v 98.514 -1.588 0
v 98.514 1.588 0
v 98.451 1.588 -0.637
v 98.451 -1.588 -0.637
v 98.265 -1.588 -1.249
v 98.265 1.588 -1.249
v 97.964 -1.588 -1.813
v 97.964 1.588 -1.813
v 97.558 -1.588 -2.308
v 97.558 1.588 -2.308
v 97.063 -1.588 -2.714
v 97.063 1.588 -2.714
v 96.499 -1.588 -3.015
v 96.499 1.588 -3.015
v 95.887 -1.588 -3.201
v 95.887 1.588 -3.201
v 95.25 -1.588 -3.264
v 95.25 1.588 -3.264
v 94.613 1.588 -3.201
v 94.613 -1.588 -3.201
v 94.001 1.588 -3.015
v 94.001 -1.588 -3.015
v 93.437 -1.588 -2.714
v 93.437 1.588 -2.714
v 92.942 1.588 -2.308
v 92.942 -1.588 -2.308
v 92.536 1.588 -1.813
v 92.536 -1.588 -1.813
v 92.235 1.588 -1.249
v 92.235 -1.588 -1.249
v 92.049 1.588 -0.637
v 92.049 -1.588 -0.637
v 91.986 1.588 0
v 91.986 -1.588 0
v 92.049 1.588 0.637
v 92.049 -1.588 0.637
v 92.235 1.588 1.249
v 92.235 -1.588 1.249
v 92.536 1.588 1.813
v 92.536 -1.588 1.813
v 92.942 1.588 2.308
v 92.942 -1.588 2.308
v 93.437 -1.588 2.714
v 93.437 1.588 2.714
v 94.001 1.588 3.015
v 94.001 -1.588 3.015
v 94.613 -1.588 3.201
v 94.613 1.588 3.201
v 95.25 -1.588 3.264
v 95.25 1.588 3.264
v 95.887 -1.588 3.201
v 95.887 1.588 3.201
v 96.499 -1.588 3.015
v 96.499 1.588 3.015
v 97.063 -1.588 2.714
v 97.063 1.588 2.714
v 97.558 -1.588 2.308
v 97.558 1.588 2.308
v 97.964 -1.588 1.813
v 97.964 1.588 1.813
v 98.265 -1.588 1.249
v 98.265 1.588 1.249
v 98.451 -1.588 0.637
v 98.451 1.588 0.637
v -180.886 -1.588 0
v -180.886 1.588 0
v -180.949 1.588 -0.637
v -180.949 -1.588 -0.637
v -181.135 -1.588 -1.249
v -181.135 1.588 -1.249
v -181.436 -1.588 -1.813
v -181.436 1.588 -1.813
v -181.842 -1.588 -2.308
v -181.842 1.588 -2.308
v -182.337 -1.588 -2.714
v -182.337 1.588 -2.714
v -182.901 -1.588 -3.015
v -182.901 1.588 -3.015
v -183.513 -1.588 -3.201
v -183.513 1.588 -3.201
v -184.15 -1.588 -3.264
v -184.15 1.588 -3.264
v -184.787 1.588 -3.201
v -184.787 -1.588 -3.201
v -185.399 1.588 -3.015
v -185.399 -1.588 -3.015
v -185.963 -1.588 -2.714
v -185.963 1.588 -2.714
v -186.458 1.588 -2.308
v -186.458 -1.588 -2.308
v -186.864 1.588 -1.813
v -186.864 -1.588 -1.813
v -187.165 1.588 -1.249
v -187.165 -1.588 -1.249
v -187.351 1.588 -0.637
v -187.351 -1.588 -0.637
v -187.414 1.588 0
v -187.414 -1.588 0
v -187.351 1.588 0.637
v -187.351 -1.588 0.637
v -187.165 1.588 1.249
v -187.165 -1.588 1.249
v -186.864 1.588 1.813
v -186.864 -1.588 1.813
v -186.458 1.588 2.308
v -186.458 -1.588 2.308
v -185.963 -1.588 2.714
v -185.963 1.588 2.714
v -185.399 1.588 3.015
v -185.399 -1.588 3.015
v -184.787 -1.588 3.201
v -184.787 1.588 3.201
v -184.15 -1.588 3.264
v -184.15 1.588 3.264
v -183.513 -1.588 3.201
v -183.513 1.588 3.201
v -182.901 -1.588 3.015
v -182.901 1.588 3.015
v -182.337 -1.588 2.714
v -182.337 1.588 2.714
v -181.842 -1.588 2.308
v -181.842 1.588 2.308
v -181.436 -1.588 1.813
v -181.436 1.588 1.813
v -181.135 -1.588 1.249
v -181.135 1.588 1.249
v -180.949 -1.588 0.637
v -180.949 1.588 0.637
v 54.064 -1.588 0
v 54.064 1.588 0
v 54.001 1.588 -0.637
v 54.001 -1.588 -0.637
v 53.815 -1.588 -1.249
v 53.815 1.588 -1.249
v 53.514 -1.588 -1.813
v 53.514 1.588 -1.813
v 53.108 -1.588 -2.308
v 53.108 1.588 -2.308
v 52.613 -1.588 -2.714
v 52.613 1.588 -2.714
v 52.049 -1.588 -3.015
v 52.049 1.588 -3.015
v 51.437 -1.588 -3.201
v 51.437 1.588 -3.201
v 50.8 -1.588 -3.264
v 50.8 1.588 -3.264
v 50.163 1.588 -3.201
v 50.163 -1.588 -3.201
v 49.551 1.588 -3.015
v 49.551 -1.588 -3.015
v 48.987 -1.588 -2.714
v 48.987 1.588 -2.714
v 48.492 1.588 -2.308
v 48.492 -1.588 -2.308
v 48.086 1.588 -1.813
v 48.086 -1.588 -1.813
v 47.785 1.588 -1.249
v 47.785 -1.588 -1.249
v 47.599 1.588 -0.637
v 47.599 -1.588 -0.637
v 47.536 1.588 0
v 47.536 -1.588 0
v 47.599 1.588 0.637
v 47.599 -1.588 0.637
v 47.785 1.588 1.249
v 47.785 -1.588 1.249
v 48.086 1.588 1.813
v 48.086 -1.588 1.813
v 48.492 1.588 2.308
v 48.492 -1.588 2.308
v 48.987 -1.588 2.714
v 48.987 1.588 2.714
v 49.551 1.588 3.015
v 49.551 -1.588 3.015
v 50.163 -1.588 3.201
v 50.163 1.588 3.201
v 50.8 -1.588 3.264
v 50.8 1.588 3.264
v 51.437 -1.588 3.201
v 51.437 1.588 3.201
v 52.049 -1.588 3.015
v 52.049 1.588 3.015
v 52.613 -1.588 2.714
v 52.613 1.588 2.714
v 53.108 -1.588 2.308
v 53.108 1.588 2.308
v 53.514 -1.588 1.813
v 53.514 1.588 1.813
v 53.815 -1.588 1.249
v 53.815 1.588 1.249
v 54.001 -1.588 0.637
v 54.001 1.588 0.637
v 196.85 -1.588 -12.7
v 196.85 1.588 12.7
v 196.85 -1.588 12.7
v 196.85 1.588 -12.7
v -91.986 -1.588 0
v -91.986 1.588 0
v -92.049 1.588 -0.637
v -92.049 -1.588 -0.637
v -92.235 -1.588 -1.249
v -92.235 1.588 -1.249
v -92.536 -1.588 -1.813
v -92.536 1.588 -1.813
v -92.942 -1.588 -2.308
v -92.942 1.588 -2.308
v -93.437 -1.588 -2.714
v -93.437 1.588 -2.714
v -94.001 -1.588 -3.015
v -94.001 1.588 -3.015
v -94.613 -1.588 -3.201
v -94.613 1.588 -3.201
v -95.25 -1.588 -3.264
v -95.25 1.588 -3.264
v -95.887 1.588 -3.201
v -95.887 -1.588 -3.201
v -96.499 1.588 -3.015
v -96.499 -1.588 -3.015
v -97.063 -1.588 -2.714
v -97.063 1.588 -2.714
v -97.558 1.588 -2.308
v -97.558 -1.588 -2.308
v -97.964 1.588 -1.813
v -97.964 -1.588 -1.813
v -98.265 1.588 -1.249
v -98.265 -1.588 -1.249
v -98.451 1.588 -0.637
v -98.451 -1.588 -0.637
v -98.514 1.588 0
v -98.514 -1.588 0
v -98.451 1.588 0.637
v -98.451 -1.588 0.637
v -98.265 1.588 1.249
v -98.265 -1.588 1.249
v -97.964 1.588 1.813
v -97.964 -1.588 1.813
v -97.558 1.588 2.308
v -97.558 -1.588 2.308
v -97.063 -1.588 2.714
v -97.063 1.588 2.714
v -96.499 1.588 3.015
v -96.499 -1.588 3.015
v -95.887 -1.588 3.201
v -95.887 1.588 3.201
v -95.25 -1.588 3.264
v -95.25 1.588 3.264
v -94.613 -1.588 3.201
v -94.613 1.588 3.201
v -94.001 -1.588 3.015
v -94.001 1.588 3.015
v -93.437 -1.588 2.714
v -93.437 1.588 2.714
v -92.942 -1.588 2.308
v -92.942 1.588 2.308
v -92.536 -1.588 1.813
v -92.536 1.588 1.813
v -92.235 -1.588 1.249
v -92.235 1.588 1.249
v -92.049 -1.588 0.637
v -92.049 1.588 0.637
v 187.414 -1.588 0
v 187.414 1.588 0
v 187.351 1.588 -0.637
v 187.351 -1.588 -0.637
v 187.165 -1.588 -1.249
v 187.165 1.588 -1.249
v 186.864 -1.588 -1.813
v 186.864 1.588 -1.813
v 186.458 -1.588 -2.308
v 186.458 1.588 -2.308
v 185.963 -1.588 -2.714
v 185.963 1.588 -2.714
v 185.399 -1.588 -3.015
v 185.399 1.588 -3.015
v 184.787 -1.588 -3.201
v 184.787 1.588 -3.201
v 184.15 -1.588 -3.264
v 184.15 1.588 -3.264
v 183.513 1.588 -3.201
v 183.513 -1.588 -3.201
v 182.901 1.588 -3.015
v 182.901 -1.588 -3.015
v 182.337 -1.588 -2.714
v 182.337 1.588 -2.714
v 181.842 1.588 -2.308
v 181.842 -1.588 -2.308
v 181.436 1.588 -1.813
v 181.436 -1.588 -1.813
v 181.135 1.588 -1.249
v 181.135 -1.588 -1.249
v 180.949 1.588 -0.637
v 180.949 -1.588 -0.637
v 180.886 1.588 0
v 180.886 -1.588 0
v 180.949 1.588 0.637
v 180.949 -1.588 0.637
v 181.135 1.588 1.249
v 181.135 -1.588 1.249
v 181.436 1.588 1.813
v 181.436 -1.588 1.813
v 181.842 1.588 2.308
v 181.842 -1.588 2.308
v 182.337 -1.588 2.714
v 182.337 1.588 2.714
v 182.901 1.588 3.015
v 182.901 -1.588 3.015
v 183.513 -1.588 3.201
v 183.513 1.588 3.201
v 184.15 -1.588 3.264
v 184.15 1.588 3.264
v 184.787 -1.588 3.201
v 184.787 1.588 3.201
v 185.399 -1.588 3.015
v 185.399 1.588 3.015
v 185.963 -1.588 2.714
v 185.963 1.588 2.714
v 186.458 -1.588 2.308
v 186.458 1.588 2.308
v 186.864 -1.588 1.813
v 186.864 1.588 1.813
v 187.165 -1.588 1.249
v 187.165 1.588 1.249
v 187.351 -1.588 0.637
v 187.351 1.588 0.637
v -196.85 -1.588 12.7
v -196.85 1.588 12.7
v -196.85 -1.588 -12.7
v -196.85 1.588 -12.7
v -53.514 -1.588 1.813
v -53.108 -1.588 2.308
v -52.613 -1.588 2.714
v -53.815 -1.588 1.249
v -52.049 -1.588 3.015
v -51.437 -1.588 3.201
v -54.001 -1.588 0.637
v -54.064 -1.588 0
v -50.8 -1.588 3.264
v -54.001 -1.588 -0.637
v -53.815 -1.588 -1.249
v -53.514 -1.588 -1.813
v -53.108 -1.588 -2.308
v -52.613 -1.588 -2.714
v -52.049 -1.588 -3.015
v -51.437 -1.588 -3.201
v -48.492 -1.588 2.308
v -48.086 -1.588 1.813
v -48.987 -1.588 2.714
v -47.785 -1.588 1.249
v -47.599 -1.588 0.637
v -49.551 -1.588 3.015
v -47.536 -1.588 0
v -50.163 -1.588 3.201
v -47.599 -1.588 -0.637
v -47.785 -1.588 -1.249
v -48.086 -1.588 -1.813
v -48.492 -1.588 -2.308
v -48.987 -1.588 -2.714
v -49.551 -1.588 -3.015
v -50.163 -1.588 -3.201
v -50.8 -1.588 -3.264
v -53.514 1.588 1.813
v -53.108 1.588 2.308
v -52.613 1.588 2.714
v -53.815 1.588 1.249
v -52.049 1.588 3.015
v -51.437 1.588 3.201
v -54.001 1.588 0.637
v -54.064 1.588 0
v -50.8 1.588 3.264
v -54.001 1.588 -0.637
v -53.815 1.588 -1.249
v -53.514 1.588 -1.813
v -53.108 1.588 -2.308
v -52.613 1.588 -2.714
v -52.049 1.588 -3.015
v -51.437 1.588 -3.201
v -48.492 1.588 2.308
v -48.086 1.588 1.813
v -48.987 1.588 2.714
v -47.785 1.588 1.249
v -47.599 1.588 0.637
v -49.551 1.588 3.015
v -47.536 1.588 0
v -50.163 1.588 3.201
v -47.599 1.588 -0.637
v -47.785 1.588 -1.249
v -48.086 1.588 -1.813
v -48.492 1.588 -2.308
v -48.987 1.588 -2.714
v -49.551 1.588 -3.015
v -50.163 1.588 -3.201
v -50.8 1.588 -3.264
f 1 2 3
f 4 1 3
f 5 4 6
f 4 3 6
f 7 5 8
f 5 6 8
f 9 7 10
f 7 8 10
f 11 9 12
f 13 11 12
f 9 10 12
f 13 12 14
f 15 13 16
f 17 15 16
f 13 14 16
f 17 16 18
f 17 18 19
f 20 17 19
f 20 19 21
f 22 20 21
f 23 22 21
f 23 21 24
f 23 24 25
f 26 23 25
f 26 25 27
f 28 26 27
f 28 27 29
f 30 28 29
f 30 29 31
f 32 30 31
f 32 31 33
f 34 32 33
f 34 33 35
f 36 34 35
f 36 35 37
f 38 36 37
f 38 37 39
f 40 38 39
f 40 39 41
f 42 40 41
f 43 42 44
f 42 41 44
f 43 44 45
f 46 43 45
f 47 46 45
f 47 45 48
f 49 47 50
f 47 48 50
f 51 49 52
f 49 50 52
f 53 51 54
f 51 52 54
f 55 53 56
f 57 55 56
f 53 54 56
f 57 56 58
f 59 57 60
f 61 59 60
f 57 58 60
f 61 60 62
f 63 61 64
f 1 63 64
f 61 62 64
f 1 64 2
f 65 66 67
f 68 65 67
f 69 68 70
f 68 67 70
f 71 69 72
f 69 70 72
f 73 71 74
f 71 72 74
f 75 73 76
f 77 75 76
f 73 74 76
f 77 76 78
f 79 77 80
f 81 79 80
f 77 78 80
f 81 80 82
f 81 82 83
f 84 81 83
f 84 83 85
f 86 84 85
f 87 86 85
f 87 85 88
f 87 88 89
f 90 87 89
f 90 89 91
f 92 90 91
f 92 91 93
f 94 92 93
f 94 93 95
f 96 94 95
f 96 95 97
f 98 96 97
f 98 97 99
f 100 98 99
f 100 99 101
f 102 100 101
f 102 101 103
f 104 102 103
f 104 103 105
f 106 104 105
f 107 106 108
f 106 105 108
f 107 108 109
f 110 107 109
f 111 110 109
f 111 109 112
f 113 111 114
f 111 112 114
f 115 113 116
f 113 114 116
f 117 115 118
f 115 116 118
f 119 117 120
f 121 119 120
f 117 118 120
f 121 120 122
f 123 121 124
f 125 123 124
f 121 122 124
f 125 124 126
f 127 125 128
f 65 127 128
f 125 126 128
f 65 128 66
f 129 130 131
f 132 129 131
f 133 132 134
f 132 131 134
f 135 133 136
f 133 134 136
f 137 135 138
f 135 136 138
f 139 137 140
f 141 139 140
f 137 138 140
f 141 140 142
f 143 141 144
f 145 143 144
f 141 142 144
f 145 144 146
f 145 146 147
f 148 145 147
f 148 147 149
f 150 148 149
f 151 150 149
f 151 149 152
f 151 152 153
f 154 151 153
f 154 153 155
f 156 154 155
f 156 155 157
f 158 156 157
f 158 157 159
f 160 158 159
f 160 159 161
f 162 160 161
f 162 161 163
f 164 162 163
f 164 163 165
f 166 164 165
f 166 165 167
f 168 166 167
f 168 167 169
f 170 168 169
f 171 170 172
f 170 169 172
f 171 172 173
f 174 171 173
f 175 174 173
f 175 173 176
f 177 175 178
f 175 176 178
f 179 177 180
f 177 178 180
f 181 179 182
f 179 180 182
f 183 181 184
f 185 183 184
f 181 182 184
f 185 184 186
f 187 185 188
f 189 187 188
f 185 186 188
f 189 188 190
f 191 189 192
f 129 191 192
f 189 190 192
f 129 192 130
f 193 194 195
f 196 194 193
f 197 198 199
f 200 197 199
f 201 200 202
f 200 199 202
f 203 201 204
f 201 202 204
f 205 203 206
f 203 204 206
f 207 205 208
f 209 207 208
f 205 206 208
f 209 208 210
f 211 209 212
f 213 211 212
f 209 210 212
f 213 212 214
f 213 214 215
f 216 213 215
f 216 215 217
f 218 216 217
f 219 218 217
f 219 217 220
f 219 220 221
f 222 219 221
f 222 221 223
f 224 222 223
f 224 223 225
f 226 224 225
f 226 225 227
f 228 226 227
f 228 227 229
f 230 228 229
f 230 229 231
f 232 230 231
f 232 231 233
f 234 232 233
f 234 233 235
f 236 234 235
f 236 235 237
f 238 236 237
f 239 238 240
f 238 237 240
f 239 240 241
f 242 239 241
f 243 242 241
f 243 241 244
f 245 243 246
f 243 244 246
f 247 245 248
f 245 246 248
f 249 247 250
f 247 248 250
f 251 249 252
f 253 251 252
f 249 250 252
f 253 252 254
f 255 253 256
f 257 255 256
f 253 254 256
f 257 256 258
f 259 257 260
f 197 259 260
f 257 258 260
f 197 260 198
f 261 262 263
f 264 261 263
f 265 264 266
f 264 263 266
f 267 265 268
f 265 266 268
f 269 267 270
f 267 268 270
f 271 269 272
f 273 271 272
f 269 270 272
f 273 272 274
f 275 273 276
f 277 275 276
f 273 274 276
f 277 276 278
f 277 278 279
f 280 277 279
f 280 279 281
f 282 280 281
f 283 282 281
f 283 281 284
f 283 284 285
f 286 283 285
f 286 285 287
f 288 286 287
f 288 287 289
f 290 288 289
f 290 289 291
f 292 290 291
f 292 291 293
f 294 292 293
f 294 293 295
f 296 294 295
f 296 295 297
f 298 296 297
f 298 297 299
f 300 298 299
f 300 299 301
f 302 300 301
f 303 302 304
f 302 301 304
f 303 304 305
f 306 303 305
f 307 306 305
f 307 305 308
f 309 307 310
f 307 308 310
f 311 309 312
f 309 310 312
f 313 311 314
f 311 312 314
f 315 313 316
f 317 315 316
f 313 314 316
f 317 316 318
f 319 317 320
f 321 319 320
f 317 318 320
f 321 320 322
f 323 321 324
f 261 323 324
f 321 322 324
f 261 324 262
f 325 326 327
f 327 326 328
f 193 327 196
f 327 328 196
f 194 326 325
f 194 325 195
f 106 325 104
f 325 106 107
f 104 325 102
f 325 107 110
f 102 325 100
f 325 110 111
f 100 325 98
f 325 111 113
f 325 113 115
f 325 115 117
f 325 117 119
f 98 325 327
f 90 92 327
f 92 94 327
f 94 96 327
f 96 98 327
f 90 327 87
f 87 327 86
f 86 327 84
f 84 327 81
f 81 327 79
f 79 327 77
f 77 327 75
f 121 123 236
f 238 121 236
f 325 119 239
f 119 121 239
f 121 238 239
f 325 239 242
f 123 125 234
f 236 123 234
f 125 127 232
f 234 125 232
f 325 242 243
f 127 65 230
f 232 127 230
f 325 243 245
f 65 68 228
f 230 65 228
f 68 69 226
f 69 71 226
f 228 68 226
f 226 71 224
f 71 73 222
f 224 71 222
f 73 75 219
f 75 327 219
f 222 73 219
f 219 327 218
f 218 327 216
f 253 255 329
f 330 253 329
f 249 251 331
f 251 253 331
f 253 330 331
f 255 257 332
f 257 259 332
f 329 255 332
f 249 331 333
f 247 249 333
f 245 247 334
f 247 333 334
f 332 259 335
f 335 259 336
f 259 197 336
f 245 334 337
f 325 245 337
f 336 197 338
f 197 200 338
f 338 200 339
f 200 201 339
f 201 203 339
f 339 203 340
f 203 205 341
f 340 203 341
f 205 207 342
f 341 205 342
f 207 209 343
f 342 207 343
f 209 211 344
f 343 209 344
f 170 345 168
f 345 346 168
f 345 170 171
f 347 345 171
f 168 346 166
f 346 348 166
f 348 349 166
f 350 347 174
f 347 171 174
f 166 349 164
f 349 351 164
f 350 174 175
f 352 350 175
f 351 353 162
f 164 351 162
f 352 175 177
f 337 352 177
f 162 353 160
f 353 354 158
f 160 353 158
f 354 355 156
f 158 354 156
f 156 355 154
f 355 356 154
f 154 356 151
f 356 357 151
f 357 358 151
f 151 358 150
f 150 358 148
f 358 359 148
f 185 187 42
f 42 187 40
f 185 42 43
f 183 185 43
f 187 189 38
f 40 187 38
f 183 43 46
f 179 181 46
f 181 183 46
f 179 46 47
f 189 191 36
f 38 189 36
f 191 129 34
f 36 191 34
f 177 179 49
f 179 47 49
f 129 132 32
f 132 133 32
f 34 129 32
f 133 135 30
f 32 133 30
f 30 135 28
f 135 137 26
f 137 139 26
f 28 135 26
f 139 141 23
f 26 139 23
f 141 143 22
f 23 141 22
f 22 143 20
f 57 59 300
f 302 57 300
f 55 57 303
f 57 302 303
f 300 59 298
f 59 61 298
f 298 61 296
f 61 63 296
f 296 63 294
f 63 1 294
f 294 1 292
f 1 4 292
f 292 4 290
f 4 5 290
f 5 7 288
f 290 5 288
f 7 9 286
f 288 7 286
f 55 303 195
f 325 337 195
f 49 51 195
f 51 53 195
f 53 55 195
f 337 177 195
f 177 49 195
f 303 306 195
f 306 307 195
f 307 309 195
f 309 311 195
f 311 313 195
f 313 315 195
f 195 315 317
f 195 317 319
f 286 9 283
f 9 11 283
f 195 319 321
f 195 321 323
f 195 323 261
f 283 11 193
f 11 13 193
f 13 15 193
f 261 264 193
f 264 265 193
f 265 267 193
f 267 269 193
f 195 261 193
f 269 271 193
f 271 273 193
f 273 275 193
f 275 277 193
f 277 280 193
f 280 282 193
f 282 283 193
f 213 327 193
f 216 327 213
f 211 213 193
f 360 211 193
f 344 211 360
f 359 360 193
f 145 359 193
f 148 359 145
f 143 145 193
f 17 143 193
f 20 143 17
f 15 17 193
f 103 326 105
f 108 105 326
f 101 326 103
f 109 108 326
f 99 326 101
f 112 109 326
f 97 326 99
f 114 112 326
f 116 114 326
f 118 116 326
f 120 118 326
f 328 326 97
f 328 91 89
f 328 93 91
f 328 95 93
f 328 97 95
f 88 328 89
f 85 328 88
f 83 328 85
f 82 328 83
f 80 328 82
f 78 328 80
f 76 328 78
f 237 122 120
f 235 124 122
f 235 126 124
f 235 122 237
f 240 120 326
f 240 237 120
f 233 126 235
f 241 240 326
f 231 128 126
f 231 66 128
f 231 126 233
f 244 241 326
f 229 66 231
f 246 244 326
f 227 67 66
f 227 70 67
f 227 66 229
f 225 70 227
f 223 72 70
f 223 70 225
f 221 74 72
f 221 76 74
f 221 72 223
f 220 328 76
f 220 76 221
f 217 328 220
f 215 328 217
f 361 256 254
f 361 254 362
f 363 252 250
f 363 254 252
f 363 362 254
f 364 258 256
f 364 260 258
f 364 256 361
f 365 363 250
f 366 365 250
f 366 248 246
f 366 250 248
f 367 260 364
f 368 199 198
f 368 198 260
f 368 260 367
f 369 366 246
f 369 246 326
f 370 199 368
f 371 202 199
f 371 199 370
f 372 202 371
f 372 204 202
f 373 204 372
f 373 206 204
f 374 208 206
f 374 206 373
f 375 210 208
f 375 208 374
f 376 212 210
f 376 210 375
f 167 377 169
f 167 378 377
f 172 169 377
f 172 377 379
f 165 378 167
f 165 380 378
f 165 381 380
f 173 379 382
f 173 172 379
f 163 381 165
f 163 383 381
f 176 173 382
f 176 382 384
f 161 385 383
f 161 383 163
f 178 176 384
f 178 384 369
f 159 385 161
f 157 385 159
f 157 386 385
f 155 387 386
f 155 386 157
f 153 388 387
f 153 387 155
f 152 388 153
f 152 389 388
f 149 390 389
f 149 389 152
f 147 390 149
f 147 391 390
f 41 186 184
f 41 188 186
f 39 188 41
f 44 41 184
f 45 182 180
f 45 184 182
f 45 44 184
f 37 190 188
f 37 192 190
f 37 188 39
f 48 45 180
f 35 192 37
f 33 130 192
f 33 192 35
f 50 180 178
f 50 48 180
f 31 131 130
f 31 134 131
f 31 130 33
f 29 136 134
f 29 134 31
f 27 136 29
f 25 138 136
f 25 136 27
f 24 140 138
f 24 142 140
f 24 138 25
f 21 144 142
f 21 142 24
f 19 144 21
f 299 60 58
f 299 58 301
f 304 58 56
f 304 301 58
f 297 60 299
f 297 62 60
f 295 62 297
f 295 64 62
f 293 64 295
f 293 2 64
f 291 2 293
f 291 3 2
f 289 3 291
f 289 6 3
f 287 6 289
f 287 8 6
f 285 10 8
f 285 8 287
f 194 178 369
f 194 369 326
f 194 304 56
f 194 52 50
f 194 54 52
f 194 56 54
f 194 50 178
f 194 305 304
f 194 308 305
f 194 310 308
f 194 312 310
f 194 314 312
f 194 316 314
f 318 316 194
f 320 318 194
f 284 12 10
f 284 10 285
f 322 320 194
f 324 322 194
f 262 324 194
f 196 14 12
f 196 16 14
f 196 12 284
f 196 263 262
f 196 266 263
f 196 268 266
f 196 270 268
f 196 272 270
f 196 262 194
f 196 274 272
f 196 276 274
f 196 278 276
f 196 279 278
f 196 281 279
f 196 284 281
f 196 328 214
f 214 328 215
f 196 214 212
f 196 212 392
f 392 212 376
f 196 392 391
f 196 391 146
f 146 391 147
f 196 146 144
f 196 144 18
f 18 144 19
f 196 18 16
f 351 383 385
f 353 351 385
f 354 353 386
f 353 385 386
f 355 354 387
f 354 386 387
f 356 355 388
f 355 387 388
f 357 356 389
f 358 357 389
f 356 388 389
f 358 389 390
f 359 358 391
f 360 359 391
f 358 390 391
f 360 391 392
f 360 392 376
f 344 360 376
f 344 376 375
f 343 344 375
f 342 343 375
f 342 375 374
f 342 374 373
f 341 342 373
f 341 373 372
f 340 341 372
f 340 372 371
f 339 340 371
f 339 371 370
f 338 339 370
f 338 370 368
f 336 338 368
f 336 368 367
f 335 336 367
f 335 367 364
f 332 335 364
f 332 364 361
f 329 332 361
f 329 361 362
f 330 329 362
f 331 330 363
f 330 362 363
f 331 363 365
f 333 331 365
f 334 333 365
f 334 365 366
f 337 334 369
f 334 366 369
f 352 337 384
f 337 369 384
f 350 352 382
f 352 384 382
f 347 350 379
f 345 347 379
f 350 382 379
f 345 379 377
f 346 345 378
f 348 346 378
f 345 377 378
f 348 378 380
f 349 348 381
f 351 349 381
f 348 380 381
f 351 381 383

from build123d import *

# Parameters (mm, degrees)
SKETCH1_W               = 393.7
SKETCH1_H               = 25.4
BOSS_EXTRUDE1_DEPTH     = 1.5875
SKETCH2_R               = 3.2639
CUT_EXTRUDE1_DEPTH      = 1
CUT_EXTRUDE1_DEPTH_BACK = 4.175


with BuildPart() as part:
    # Sketch1 → Boss-Extrude1 (new body, symmetric)
    with BuildSketch(Plane(origin=(0, 0, 0), x_dir=(1, 0, 0), z_dir=(0, 1, 0))):
        Rectangle(SKETCH1_W, SKETCH1_H)
    extrude(amount=BOSS_EXTRUDE1_DEPTH, both=True)

    # Sketch2 → Cut-Extrude1 (cut, two sides)
    with BuildSketch(Plane(origin=(0, 1.5875, 0), x_dir=(1, 0, 0), z_dir=(0, 1, 0))) as cut_extrude1_sk:
        with Locations((-184.15, 0)):
            Circle(SKETCH2_R)
        with Locations((184.15, 0)):
            Circle(SKETCH2_R)
        with Locations((-95.25, 0)):
            Circle(SKETCH2_R)
        with Locations((95.25, 0)):
            Circle(SKETCH2_R)
        with Locations((-50.8, 0)):
            Circle(SKETCH2_R)
        with Locations((50.8, 0)):
            Circle(SKETCH2_R)
    extrude(amount=CUT_EXTRUDE1_DEPTH, mode=Mode.SUBTRACT)
    extrude(cut_extrude1_sk.sketch, amount=-CUT_EXTRUDE1_DEPTH_BACK, mode=Mode.SUBTRACT)


solid = part.part
